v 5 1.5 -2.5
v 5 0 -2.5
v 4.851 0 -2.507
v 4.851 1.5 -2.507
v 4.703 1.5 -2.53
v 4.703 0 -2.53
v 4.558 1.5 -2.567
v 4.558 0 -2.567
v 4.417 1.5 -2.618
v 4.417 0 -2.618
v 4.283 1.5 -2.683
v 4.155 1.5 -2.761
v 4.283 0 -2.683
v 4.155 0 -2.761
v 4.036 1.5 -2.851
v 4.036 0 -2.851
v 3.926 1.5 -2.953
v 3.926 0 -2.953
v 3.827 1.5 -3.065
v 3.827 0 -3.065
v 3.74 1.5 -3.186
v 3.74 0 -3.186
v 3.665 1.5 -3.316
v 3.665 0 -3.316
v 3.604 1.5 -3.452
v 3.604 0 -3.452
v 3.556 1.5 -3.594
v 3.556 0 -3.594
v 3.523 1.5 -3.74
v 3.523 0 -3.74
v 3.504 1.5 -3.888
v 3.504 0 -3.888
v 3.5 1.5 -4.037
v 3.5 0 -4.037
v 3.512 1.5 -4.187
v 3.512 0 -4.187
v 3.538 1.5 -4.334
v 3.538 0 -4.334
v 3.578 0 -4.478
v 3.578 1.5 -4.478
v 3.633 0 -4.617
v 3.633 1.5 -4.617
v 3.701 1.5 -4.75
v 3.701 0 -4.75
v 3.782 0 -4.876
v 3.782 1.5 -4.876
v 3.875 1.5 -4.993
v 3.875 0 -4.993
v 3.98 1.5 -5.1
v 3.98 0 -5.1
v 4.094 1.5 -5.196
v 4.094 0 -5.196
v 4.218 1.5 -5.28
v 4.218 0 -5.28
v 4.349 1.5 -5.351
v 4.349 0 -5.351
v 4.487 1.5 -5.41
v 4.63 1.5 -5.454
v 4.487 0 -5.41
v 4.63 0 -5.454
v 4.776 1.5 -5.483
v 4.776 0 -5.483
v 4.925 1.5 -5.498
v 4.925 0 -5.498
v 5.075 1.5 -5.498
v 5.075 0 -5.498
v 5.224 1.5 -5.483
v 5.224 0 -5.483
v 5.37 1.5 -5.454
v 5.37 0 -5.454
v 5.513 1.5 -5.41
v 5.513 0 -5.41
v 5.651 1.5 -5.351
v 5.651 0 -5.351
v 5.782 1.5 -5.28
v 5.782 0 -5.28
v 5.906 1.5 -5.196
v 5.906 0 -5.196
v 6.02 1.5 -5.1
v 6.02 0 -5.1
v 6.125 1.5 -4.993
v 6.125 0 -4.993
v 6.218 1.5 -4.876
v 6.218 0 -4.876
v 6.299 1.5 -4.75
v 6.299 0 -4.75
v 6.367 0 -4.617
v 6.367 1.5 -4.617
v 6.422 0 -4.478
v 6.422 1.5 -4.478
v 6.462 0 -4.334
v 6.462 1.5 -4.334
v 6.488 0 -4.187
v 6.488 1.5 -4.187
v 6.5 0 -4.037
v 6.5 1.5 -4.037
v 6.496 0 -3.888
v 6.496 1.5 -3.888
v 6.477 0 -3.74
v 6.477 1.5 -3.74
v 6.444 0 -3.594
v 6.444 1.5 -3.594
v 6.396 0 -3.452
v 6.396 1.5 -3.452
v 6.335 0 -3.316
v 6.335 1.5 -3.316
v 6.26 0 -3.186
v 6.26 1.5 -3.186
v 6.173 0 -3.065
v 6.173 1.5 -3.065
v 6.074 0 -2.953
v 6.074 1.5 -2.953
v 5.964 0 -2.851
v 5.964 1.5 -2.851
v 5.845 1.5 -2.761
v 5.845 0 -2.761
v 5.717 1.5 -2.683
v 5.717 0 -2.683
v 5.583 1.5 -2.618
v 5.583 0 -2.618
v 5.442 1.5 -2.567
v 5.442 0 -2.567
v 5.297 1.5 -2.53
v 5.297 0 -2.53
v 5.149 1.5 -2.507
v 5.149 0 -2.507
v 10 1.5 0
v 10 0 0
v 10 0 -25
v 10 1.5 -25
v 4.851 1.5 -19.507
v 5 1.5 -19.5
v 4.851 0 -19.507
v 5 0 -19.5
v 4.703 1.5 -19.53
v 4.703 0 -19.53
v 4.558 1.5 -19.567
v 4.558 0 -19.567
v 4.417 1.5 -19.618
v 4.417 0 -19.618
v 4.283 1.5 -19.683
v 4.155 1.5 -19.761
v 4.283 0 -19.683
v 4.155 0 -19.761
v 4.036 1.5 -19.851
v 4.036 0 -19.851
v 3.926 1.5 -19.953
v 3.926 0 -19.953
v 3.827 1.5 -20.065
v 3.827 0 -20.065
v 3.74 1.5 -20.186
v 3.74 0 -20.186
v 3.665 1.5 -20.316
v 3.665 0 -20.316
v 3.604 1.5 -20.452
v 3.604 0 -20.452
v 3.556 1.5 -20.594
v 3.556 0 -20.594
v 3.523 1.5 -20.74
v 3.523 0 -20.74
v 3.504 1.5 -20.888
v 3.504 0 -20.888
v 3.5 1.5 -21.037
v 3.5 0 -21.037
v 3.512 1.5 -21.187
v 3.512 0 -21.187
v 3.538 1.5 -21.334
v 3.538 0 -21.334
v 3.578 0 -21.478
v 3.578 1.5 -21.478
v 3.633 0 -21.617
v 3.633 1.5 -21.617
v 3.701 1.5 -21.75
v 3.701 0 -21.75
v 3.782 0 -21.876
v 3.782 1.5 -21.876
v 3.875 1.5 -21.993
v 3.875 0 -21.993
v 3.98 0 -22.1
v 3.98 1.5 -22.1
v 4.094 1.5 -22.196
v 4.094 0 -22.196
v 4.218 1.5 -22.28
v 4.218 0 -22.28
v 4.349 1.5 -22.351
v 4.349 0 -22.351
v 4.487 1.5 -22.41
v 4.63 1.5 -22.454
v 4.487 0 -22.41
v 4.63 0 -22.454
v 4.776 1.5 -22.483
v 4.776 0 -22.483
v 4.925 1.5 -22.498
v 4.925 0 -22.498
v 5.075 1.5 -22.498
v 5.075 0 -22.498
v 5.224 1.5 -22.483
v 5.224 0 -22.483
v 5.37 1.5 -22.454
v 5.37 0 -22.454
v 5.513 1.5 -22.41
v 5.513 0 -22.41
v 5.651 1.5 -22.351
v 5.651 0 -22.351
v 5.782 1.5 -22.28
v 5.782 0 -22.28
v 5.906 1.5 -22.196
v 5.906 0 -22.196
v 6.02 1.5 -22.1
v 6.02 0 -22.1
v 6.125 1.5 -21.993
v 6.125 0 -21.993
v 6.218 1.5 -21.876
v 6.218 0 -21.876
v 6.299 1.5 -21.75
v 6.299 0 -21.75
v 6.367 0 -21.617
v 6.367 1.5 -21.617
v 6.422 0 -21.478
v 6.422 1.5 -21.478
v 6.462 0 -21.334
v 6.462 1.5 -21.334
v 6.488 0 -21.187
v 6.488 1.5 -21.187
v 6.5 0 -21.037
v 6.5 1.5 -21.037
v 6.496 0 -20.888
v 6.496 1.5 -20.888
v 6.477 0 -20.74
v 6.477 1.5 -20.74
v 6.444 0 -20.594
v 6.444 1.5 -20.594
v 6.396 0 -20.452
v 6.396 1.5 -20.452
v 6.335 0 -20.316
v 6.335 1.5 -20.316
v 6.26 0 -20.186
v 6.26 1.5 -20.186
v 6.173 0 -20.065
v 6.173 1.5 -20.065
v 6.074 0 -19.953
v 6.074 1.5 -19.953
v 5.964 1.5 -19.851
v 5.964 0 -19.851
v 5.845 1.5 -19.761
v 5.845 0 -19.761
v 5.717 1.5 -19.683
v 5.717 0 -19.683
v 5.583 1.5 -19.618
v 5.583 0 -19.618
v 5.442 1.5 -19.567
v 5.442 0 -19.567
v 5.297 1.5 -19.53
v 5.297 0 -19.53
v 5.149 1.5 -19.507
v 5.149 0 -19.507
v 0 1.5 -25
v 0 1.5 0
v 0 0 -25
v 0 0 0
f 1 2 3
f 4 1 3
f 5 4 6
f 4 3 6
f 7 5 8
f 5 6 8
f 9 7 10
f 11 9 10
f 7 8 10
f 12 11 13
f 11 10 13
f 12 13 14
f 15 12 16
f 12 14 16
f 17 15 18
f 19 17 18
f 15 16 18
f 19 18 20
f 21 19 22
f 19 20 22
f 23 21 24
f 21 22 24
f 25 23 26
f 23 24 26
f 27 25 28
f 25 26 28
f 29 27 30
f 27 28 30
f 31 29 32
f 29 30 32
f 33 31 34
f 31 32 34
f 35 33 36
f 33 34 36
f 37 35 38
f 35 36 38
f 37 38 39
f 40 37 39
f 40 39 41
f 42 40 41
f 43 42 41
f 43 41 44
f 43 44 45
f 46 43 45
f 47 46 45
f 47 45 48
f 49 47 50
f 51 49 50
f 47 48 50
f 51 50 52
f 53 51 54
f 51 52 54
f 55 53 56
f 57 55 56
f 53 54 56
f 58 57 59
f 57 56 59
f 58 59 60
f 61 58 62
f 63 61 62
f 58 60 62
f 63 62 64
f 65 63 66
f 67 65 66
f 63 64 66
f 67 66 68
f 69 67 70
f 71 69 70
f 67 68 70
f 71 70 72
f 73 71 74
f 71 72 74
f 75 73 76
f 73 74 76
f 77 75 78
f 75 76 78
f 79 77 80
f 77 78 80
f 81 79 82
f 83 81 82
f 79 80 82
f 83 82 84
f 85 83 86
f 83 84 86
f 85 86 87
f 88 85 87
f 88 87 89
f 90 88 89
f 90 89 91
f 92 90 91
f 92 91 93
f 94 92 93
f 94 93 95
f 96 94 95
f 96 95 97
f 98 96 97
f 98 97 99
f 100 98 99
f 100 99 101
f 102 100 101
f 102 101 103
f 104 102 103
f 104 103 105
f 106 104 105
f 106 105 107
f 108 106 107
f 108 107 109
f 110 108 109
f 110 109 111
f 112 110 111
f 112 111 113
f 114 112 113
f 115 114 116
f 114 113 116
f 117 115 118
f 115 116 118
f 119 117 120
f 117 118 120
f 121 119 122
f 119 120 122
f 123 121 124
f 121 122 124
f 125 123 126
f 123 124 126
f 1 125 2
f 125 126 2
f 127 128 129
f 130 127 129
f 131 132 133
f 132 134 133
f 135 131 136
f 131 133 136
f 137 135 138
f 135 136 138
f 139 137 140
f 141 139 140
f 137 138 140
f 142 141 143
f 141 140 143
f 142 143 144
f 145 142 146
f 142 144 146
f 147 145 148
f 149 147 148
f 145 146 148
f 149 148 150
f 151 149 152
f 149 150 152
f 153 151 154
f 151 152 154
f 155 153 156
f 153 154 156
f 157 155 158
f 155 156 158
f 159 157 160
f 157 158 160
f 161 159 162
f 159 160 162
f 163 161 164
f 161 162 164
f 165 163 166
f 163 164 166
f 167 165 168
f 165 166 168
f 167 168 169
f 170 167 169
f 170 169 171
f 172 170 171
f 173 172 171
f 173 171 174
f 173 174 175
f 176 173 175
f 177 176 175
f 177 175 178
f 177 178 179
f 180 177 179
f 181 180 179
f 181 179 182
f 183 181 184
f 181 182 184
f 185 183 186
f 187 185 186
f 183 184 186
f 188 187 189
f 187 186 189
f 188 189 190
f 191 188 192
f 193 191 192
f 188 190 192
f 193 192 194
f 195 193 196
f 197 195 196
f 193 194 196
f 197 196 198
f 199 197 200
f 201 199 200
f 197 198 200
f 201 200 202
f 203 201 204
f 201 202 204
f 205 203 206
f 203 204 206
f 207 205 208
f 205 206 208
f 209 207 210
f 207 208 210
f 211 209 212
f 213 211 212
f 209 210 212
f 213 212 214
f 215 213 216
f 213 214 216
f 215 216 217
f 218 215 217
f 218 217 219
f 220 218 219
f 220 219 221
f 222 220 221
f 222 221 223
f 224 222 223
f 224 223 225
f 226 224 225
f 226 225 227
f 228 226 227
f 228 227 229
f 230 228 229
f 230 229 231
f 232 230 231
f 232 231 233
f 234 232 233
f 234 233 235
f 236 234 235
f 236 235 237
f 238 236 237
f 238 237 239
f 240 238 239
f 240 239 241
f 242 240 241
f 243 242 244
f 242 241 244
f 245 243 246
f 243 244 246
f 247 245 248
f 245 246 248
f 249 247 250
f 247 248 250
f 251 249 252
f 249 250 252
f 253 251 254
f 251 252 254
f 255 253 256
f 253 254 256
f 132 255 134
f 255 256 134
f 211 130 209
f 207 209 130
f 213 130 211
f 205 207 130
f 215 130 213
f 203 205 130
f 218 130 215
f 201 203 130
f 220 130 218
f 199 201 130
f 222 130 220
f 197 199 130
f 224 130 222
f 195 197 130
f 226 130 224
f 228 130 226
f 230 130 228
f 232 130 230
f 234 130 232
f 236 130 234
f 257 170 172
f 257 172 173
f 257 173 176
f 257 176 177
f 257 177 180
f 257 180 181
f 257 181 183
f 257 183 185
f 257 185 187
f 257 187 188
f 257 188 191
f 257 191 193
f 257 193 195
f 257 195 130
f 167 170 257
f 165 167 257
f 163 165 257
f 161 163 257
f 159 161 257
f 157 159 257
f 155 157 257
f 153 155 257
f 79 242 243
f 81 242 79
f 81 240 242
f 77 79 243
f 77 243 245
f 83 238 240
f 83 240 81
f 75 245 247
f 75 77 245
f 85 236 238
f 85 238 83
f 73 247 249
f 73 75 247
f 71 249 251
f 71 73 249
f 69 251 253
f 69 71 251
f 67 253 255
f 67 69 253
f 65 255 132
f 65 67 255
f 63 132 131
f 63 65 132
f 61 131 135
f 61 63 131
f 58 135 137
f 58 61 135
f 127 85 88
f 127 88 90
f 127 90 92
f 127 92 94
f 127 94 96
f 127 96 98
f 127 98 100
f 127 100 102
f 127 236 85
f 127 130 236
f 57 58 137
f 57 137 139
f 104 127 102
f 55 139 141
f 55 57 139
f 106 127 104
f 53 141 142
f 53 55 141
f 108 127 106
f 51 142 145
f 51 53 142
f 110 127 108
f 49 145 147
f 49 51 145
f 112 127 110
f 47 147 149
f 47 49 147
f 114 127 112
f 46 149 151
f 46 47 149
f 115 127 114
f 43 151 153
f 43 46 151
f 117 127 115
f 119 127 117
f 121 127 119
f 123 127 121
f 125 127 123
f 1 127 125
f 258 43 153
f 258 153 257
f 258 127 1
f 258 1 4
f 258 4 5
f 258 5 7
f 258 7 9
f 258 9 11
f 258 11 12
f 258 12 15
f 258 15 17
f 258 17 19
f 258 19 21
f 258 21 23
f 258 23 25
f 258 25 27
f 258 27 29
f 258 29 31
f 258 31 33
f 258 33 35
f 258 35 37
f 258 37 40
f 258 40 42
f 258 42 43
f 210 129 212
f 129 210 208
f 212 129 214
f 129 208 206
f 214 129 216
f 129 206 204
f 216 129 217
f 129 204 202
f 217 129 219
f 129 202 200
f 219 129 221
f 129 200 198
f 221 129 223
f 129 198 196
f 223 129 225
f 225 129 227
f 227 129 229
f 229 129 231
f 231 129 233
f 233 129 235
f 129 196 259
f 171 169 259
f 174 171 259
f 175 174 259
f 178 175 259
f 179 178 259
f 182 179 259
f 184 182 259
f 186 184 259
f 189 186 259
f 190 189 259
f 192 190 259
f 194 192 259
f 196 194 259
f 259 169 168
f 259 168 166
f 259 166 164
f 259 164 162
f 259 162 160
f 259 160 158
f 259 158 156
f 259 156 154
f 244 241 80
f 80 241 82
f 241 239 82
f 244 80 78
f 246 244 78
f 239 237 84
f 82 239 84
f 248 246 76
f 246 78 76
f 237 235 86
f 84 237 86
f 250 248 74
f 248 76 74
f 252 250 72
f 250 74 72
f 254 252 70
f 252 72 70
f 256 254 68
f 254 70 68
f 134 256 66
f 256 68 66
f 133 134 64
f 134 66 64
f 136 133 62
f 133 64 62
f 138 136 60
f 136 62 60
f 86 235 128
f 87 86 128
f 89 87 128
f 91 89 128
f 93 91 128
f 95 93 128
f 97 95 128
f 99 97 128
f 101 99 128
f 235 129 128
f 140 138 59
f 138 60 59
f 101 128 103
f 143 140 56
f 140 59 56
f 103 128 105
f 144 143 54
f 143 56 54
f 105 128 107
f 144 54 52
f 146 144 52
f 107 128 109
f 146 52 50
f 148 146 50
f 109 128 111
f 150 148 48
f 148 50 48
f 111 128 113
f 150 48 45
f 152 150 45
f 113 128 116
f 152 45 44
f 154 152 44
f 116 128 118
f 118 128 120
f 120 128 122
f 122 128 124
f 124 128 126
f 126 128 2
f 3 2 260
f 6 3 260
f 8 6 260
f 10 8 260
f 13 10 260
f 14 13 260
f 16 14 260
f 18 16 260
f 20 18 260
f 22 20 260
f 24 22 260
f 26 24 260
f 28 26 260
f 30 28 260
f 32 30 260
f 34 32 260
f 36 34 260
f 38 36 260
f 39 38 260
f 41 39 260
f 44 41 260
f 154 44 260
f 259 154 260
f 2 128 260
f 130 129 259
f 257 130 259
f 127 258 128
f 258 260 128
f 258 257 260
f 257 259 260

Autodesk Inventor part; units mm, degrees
ref_plane "YZ Plane" through (0, 0, 0) normal (1, 0, 0) x (0, 1, 0)
ref_plane "XZ Plane" through (0, 0, 0) normal (0, 1, 0) x (-1, 0, 0)
ref_plane "XY Plane" through (0, 0, 0) normal (0, 0, 1) x (1, 0, 0)
sketch "Skizze1" plane through (0, 0, 0) normal (0, 1, 0) x (-1, 0, 0)
  line L0 (0, 0) -> (-10, 0)
  line L1 (-10, 0) -> (-10, -25)
  line L2 (-10, -25) -> (0, -25)
  line L3 (0, -25) -> (0, 0)
  dimension "d0" = 10
  dimension "d1" = 25
extrude "Extrusion1" add sketch "Skizze1" along normal blind 1.5
sketch "Skizze2" plane through (0, 1.5, 0) normal (0, 1, 0) x (1, 0, 0)
  line L0 (0, 0) -> (10, 0) projected
  line L1 (10, 0) -> (10, 25) projected
  point P0 (5, 4)
  point P1 (5, 21)
  dimension "d4" = 17
  dimension "d6" = 4
  dimension "d7" = 5
  dimension "d8" = 5
hole "Bohrung1" at (5, 1.5, -4) at (5, 1.5, -21) direction (0, -1, 0) diameter 3 end through all
properties part number "montageplatte_rad_vorne"
